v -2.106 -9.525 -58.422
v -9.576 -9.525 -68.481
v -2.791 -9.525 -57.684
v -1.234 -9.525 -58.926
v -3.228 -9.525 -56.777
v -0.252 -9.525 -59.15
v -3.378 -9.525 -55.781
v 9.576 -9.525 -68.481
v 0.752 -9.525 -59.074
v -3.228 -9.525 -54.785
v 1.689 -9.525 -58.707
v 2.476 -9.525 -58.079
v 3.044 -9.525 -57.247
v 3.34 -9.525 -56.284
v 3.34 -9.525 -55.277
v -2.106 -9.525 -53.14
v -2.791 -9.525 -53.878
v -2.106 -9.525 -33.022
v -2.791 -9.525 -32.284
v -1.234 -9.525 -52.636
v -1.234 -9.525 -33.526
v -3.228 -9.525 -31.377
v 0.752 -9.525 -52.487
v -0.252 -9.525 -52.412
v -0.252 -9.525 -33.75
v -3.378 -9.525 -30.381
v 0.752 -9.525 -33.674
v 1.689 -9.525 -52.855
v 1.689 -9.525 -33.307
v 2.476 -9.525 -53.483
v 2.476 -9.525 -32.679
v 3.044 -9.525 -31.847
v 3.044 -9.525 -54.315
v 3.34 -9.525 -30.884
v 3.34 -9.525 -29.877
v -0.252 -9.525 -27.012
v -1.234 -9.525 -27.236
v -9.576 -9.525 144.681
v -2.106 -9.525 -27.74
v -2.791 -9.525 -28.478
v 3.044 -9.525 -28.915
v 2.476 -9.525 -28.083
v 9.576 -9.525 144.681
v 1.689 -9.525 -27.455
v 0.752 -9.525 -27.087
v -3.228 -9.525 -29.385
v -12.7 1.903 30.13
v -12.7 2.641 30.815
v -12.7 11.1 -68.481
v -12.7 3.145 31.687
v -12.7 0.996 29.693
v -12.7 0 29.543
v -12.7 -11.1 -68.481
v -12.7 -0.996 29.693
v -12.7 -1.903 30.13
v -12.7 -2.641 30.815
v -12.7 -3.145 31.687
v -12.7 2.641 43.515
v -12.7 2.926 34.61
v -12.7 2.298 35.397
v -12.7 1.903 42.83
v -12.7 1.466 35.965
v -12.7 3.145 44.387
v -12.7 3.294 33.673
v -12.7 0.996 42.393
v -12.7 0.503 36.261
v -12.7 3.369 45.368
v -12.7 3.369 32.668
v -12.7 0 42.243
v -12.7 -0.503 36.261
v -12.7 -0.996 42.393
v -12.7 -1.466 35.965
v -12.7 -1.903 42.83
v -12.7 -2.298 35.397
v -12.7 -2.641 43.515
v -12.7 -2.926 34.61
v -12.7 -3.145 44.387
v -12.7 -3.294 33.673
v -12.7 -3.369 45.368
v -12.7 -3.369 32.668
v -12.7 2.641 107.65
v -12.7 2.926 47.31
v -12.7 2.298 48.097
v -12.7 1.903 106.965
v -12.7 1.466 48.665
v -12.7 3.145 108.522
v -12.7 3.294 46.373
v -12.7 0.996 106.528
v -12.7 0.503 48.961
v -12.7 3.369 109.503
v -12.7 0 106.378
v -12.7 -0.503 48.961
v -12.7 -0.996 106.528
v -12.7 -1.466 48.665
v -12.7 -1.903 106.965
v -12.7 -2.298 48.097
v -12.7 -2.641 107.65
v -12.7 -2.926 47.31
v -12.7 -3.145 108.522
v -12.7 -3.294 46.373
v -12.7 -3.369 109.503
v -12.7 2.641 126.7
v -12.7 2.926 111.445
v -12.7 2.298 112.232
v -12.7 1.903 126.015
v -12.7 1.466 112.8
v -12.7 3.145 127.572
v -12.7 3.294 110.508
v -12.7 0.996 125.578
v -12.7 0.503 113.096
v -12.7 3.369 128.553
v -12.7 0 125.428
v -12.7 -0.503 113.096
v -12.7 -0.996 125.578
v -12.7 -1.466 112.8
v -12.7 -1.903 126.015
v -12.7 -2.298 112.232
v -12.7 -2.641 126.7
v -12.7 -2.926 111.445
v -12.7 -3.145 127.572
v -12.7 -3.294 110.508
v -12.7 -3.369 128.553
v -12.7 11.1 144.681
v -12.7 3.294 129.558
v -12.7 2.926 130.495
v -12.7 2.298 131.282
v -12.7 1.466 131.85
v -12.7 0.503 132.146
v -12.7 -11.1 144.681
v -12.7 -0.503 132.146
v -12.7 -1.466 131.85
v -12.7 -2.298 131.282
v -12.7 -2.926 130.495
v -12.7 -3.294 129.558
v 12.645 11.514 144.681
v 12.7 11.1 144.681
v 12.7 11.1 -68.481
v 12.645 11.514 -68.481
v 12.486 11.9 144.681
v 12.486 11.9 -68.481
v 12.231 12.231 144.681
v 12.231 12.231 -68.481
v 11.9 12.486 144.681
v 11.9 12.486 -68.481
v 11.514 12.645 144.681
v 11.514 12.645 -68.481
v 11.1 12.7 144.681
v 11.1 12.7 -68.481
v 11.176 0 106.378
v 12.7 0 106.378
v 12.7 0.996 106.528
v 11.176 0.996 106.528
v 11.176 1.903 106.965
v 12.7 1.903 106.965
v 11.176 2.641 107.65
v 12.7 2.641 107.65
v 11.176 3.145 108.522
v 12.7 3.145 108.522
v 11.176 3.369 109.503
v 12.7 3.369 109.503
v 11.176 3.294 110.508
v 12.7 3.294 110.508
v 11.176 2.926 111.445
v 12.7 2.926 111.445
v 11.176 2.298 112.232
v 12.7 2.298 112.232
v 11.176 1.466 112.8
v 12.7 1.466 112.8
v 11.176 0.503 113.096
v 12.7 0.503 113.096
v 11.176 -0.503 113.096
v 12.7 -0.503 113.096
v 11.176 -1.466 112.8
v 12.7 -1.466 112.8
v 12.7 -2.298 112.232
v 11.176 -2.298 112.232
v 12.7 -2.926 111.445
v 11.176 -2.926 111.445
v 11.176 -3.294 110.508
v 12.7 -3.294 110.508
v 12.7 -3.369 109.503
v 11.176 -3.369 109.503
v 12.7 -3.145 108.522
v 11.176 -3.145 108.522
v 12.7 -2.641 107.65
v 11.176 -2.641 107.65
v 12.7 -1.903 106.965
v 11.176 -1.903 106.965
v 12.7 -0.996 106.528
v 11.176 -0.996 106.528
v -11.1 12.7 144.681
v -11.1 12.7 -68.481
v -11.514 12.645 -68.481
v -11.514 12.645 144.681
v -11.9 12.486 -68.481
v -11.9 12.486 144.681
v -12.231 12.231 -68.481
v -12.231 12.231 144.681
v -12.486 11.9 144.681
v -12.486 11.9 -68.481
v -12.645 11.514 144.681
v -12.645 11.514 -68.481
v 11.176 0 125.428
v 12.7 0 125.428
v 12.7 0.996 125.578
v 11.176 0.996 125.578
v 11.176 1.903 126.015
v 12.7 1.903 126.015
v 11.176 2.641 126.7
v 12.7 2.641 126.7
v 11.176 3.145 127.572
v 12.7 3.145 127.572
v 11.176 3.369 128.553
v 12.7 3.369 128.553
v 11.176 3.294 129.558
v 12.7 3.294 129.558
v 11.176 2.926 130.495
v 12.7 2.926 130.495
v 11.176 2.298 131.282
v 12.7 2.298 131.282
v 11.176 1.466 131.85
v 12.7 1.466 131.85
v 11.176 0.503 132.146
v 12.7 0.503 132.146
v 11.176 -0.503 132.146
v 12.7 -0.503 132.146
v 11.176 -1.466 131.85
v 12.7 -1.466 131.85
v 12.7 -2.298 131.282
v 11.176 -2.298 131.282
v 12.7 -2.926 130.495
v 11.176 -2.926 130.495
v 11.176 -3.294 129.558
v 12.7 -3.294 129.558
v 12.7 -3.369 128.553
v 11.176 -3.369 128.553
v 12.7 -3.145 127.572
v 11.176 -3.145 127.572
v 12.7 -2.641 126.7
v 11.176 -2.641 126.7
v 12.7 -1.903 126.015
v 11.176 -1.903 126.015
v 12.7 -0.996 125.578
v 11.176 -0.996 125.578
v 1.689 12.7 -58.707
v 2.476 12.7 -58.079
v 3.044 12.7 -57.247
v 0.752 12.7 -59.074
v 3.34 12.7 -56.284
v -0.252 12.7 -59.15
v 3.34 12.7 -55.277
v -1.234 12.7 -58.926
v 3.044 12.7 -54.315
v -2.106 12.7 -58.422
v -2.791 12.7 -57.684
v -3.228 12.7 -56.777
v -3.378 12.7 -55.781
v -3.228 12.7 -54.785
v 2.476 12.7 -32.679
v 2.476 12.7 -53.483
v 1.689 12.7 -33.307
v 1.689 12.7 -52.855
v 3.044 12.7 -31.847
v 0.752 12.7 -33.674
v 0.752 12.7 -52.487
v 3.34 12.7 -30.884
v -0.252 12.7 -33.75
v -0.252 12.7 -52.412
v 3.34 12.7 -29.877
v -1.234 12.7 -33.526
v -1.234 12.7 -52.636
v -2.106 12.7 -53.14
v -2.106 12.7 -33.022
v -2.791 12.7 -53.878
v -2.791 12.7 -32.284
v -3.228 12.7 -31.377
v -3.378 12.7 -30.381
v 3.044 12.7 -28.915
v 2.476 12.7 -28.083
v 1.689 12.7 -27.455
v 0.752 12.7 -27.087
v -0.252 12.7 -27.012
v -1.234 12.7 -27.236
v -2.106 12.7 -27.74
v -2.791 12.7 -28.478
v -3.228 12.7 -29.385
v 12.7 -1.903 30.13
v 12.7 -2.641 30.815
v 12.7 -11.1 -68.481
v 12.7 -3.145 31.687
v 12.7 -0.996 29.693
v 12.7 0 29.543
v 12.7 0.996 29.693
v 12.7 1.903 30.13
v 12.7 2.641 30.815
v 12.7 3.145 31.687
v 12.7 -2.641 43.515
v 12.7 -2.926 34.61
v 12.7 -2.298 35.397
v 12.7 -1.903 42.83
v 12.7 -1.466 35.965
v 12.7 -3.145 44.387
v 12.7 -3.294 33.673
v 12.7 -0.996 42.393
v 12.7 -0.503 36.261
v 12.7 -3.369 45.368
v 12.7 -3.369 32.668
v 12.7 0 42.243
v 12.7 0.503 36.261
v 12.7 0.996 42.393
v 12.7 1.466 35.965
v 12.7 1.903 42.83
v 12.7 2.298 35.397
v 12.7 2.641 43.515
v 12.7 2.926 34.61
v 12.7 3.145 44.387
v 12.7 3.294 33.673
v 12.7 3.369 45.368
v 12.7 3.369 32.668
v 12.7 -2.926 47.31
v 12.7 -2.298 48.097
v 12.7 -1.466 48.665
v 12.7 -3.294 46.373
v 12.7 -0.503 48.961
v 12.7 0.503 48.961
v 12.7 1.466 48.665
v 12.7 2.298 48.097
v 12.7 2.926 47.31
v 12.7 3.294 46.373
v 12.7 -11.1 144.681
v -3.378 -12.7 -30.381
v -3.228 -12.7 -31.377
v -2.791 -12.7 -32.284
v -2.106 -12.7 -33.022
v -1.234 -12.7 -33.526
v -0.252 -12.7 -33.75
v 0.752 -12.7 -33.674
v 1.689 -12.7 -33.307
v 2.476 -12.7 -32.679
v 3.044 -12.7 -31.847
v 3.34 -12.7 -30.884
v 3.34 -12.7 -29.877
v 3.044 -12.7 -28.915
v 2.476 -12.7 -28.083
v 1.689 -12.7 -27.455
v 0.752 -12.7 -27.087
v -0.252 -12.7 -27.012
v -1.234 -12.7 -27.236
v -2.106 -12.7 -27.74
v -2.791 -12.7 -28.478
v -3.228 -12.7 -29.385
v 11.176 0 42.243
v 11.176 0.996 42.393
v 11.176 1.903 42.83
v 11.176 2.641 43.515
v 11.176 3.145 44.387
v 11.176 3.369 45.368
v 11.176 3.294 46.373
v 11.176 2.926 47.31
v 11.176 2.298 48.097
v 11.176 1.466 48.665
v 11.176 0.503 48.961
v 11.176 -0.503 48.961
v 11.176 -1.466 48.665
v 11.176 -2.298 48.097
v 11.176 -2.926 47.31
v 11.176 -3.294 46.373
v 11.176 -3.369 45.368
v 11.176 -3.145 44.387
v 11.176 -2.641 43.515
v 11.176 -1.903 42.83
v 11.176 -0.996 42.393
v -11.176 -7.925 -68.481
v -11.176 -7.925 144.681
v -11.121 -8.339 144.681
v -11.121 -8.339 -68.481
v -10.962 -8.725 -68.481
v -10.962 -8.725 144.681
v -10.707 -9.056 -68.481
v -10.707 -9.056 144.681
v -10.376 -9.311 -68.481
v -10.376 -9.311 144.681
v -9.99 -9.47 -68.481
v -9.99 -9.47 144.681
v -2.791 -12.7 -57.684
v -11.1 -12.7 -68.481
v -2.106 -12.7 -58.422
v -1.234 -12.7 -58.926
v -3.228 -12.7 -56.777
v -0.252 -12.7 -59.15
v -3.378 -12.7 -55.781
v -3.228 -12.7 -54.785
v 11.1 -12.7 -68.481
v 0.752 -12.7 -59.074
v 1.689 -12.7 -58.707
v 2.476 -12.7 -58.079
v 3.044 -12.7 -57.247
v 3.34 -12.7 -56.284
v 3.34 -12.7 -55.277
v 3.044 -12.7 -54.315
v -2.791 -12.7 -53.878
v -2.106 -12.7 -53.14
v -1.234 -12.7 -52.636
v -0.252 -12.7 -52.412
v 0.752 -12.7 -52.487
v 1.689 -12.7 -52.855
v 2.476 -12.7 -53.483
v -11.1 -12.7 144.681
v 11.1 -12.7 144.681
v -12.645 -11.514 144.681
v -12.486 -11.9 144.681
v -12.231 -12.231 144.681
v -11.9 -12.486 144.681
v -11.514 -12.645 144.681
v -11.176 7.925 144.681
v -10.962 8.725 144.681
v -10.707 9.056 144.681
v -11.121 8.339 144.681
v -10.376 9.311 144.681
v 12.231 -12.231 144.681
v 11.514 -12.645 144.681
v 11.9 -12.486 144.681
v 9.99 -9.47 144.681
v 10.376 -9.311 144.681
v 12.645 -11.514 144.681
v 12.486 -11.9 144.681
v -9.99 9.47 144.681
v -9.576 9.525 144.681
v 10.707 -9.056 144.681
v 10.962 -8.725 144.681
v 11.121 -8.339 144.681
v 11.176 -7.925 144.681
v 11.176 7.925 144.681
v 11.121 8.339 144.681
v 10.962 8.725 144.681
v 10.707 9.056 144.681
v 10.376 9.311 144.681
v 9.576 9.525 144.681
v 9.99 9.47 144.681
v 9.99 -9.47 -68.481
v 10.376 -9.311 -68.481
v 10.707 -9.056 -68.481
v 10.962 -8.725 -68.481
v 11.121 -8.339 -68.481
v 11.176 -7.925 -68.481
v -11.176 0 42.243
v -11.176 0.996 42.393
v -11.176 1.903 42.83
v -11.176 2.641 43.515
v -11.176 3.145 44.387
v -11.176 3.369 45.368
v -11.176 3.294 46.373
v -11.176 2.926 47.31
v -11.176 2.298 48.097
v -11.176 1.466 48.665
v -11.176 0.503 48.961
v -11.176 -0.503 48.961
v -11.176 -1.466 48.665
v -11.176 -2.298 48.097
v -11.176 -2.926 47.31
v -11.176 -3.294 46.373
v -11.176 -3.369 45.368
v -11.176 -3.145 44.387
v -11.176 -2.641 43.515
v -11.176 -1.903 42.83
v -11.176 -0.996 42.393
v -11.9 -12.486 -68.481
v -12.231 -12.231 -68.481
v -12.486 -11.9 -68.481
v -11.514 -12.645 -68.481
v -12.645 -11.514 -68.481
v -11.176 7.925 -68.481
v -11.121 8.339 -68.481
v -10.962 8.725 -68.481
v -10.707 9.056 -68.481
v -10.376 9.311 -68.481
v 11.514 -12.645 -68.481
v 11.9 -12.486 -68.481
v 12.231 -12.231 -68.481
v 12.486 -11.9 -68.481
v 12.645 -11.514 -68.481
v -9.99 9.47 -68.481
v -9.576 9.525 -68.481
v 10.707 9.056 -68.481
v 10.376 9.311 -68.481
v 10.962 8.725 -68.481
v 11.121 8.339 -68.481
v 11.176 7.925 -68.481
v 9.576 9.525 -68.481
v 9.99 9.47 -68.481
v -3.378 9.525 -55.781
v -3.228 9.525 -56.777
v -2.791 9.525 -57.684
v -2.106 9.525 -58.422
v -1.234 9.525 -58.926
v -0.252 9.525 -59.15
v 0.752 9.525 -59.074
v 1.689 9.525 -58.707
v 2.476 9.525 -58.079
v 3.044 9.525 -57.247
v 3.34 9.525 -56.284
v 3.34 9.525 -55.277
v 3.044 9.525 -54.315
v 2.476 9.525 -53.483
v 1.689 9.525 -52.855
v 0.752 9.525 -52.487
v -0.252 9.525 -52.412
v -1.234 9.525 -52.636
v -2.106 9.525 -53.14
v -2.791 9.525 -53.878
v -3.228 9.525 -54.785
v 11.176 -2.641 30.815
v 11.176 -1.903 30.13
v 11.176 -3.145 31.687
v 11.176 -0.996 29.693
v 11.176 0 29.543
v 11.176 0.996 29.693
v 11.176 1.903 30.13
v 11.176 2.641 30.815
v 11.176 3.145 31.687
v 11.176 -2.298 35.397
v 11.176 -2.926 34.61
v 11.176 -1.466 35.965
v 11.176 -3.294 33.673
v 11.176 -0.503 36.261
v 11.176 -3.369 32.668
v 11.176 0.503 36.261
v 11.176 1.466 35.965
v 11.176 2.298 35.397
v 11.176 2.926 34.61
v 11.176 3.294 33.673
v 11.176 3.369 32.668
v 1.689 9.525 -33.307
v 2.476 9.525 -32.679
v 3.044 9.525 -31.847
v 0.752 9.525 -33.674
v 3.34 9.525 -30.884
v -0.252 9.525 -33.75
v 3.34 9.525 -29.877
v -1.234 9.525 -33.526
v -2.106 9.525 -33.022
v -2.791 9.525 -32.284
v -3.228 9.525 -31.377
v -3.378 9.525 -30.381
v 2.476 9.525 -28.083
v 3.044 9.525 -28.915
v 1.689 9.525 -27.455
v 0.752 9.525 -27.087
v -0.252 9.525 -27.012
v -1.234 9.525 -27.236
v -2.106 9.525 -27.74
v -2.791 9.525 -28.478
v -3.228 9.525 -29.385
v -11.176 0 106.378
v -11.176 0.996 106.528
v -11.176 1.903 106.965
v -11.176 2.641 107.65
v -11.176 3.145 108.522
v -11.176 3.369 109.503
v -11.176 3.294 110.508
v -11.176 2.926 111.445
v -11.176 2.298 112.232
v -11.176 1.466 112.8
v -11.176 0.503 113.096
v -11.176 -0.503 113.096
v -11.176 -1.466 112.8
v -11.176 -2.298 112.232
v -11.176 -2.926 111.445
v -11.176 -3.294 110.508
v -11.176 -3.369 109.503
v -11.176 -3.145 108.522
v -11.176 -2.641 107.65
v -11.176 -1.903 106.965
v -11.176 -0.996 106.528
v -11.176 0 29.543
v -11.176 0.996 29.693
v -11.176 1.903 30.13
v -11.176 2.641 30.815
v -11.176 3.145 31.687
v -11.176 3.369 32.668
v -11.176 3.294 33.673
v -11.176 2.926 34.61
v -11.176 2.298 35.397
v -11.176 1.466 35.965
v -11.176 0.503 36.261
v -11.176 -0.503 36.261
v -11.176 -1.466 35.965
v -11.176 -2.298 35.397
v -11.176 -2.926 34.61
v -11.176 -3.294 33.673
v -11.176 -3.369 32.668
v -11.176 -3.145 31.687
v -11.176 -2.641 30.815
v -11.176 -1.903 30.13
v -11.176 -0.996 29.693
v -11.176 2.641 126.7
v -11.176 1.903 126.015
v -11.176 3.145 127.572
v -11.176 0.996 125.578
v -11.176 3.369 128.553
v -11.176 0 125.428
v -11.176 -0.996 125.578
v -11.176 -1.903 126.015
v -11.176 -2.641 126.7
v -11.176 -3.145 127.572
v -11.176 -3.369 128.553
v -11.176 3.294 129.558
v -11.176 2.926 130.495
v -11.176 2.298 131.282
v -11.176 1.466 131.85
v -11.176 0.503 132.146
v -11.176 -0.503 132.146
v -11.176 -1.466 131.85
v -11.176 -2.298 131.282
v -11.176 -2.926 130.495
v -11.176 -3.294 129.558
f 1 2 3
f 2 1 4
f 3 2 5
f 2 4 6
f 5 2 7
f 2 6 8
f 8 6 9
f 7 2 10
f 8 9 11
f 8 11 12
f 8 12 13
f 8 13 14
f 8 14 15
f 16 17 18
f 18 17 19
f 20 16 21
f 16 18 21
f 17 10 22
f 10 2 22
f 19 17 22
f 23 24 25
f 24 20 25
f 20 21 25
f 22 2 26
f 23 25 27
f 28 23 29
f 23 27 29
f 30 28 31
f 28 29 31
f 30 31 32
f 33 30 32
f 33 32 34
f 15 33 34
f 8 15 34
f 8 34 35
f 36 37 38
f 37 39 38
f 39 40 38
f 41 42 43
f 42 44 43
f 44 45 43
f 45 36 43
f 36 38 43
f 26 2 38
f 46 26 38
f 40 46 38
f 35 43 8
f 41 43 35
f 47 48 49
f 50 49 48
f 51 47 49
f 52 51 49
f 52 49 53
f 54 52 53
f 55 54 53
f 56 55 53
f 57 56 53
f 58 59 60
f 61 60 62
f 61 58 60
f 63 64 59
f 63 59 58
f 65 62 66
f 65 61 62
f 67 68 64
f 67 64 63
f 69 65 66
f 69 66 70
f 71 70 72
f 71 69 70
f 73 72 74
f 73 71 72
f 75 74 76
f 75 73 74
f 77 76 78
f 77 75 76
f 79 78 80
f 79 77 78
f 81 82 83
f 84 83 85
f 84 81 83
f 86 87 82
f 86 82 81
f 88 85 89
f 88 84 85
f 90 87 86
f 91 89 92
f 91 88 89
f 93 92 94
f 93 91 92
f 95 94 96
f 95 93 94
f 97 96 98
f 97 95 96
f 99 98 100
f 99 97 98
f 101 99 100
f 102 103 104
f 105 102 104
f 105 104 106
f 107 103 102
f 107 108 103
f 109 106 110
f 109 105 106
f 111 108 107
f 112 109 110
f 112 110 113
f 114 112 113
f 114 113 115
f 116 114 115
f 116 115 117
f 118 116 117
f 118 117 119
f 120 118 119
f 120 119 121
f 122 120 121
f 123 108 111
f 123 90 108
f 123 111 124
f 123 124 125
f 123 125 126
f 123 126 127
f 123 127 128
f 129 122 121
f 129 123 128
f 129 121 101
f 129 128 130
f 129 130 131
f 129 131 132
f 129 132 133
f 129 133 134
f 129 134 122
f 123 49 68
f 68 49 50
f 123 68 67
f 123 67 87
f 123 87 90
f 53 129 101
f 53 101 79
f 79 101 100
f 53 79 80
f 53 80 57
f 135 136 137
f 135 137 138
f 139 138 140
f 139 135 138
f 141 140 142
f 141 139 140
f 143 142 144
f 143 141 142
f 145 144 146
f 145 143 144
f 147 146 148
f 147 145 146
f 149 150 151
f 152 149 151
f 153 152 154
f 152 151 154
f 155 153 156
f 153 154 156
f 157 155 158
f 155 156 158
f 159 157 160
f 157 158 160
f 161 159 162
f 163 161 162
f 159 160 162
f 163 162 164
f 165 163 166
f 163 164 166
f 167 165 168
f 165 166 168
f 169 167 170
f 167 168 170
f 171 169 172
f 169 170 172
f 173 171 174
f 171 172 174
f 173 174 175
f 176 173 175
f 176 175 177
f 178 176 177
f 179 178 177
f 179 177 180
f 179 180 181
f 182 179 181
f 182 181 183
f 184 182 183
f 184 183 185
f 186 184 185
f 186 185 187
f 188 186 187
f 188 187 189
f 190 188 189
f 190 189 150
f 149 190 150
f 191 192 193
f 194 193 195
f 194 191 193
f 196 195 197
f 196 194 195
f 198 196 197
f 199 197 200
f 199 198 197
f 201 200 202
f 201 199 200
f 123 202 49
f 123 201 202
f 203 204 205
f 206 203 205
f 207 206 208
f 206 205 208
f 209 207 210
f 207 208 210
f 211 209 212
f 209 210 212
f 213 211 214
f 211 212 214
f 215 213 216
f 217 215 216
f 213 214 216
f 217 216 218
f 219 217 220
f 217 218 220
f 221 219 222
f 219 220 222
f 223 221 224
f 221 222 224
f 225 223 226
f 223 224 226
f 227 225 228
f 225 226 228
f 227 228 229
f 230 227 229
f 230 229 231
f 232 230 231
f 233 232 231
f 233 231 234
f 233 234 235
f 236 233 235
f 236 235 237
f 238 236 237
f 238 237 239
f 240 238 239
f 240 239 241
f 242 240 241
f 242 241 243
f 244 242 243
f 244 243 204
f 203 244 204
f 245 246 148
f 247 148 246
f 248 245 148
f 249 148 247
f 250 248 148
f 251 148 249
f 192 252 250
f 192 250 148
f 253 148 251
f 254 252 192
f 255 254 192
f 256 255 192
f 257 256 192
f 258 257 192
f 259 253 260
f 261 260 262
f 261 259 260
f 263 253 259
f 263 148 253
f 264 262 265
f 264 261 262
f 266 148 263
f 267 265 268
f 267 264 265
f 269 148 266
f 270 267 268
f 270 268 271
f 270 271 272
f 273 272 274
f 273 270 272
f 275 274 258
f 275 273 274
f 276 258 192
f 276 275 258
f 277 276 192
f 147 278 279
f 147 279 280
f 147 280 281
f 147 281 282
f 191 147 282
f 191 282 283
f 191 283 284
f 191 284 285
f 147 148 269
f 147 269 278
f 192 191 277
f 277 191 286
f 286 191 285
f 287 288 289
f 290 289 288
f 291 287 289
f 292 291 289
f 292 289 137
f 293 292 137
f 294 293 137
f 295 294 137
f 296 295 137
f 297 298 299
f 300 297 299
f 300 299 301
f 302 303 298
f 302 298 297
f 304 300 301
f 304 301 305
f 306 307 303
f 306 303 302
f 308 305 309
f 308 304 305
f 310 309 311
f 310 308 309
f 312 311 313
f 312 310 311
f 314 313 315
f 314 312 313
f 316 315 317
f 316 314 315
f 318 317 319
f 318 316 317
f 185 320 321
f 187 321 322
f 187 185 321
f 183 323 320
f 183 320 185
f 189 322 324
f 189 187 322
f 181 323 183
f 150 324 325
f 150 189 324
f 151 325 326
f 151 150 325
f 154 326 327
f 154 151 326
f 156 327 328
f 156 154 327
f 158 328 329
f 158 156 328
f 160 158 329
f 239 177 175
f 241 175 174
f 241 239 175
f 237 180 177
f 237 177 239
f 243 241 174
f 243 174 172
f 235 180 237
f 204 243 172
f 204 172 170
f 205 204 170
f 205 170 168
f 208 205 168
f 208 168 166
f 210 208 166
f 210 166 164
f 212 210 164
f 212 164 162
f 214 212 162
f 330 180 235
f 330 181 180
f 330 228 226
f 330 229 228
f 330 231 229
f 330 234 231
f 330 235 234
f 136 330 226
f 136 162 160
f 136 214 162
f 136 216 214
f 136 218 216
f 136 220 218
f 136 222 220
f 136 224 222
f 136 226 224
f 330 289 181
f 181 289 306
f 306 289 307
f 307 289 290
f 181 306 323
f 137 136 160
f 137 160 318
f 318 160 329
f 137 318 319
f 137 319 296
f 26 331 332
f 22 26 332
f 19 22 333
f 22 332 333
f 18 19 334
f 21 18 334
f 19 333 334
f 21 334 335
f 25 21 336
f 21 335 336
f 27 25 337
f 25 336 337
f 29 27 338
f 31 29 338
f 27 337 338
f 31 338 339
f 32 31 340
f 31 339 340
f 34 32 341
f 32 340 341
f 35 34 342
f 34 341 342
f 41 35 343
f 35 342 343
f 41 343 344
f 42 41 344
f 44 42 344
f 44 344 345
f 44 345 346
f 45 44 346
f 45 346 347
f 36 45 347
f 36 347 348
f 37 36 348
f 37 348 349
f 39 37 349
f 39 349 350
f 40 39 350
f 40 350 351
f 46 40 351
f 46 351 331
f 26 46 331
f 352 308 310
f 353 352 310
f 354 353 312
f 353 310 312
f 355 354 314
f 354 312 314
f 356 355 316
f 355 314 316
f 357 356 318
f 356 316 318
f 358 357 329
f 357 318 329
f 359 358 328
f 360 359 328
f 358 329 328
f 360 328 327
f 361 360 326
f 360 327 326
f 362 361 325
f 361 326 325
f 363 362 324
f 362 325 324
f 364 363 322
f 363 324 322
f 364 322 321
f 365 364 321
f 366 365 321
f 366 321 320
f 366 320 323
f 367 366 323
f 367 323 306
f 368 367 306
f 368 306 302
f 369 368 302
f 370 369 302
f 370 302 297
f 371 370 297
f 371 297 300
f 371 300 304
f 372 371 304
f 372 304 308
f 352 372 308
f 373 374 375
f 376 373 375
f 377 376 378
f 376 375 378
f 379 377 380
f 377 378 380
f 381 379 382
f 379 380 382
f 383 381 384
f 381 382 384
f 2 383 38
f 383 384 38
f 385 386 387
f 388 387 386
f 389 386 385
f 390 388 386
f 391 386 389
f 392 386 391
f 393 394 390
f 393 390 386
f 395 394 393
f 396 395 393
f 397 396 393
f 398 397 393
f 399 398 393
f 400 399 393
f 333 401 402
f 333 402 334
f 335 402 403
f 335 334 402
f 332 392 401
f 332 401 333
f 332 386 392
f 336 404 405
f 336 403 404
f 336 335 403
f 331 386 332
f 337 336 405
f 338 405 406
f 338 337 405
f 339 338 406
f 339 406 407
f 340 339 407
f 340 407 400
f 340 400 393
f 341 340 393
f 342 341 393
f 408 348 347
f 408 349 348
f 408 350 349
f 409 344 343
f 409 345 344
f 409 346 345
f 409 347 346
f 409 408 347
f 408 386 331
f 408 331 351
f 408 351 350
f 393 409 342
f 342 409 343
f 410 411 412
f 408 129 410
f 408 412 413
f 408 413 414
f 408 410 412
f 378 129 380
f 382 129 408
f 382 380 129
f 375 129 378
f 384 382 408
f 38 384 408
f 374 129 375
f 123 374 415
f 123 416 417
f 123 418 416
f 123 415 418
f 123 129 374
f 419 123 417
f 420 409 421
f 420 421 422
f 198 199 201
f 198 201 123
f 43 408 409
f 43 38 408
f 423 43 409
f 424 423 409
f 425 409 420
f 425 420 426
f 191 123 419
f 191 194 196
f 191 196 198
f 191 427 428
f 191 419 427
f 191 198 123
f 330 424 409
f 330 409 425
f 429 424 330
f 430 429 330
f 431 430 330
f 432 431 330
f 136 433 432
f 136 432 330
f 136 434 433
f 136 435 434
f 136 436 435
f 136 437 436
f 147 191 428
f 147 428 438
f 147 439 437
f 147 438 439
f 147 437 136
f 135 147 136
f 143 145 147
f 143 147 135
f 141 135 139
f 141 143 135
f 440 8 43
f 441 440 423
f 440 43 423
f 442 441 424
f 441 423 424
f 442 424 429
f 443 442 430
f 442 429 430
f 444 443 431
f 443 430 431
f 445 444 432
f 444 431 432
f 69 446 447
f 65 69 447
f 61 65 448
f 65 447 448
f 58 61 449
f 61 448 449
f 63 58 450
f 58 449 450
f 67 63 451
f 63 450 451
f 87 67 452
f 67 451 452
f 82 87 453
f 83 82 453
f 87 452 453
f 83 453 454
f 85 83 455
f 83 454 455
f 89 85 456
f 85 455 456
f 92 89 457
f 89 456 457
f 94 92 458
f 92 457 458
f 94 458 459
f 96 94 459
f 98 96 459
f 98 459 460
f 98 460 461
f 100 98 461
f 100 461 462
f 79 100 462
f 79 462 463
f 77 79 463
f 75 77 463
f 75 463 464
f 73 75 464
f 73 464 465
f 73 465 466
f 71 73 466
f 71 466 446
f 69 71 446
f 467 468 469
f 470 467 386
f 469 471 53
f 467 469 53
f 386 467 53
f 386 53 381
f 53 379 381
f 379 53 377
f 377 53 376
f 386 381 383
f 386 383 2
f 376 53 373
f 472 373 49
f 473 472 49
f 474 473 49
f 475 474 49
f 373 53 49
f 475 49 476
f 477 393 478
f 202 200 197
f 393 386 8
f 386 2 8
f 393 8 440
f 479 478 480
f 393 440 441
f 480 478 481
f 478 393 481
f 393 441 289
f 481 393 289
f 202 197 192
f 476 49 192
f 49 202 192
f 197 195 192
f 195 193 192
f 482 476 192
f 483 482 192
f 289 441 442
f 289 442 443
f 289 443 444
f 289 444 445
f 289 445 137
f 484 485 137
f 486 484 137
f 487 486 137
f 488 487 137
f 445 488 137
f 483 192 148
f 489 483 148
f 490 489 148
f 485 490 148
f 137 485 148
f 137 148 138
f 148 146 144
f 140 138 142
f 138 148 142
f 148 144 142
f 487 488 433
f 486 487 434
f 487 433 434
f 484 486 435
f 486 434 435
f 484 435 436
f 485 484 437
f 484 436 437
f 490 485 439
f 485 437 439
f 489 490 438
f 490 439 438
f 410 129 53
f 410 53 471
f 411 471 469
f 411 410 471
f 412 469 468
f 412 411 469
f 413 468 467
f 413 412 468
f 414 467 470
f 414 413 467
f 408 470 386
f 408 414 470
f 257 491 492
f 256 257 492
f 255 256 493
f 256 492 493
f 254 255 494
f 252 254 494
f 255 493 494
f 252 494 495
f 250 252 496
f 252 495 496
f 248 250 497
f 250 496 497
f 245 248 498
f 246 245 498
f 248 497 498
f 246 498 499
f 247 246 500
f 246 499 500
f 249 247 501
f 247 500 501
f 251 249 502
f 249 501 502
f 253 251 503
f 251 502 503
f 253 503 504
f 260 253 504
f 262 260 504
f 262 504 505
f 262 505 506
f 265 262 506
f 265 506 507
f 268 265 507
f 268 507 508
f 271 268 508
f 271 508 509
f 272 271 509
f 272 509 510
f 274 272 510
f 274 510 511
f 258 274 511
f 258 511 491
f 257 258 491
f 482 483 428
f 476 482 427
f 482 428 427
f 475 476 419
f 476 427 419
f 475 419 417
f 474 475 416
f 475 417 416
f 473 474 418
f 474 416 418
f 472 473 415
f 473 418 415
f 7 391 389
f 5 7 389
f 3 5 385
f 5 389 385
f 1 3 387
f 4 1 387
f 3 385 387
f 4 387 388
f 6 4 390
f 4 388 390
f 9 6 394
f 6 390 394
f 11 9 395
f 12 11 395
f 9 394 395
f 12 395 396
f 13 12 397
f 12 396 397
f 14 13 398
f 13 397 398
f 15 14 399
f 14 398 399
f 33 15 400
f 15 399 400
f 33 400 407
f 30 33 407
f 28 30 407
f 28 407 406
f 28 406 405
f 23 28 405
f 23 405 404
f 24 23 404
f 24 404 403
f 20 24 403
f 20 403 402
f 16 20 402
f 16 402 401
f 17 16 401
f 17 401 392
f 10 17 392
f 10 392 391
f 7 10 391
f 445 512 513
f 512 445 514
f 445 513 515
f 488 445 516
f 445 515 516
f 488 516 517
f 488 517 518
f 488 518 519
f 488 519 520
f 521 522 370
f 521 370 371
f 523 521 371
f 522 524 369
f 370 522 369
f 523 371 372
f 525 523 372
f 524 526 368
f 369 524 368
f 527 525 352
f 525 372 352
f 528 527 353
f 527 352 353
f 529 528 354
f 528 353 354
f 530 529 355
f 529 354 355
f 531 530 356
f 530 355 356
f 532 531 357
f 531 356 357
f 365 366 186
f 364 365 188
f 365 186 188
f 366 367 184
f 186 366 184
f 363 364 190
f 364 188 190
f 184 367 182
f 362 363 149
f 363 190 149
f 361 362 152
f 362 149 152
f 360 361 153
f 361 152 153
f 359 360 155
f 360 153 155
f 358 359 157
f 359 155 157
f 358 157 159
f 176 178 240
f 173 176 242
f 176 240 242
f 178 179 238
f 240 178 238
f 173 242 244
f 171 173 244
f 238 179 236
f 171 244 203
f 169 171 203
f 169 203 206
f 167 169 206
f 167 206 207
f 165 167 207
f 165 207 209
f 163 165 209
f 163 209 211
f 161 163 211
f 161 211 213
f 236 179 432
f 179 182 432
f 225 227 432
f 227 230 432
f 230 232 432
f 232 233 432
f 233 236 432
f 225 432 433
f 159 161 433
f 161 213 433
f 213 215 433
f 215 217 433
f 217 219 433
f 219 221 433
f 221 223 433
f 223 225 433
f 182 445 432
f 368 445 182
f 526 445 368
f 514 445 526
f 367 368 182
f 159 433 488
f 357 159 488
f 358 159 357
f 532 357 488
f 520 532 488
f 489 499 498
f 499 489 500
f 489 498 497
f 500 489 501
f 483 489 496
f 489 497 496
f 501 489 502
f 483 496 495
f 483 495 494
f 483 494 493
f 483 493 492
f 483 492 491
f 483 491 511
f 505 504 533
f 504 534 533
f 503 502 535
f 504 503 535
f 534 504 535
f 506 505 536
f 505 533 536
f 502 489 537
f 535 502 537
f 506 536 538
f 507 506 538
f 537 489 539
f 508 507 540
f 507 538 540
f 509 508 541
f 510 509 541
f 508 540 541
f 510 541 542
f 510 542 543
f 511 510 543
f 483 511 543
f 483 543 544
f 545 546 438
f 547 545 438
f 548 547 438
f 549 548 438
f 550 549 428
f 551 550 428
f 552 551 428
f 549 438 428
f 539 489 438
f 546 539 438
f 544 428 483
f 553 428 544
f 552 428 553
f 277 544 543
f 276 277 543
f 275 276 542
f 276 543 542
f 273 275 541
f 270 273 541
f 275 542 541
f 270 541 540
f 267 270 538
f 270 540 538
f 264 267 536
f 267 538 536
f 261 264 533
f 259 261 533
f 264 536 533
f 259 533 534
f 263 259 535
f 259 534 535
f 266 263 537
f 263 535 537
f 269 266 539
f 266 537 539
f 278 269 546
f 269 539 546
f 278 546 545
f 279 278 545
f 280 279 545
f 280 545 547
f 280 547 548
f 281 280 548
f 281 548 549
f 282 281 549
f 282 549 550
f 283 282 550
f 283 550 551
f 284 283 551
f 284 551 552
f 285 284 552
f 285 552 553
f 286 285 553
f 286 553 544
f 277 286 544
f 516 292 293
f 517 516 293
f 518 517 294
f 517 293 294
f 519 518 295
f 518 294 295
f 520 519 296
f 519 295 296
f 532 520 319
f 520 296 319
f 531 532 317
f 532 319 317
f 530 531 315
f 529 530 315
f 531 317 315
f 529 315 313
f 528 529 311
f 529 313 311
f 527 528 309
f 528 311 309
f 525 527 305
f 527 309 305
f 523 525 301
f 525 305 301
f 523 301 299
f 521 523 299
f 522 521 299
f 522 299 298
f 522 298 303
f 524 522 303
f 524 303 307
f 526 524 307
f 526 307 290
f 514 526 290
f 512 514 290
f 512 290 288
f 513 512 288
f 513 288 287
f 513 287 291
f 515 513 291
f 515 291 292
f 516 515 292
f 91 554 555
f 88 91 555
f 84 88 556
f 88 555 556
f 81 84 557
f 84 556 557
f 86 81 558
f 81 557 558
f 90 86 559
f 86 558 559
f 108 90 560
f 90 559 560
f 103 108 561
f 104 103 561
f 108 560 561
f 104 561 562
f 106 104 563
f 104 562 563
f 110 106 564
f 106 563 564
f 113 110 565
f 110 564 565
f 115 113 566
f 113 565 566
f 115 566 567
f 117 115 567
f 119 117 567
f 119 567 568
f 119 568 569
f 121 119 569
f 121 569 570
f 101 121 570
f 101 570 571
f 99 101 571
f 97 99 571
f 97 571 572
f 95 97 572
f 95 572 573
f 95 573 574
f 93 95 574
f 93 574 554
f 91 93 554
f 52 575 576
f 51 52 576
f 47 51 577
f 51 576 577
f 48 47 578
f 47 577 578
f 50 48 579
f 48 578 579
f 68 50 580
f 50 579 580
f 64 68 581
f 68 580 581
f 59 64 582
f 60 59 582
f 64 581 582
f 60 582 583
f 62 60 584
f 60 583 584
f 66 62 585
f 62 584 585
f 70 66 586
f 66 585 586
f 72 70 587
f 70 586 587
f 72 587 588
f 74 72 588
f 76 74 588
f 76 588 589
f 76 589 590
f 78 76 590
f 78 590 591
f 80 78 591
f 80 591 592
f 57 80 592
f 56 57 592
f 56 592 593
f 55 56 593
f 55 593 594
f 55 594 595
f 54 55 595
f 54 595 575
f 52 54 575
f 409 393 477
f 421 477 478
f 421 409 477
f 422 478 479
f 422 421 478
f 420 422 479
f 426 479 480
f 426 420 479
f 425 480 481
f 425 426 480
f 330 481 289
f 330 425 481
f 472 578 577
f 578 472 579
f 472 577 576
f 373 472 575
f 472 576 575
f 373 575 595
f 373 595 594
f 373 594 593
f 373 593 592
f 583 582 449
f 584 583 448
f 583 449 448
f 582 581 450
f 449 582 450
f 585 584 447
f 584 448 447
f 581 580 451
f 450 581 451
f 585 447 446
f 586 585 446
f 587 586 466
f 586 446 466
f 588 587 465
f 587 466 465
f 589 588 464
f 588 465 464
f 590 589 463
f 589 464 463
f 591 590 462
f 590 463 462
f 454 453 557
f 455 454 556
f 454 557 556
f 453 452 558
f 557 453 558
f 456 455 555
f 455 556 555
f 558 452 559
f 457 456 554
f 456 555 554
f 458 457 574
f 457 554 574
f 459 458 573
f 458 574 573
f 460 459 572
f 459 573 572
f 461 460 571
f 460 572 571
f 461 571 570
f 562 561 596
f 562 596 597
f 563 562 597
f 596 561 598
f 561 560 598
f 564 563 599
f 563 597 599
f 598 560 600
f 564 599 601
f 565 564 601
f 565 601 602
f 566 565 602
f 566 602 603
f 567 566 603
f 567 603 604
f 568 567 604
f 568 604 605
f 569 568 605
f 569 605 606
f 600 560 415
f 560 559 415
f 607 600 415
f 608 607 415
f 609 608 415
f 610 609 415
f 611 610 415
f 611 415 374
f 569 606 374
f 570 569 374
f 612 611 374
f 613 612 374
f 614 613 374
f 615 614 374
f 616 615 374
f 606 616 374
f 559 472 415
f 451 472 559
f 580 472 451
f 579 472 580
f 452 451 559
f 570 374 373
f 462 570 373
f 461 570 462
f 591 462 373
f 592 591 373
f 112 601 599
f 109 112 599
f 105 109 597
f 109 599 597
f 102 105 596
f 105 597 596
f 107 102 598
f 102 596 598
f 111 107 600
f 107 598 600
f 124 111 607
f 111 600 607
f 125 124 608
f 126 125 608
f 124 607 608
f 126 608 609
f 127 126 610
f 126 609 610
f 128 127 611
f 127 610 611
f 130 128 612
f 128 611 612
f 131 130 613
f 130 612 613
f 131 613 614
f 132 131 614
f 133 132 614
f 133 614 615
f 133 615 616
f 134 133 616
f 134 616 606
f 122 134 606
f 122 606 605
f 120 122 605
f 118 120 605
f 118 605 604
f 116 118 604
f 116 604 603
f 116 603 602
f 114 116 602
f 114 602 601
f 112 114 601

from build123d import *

# Parameters (mm, degrees)
SKETCH3_W               = 25.4
SKETCH3_H               = 25.4
SKETCH3_W_2             = 22.352
SKETCH3_H_2             = 19.05
BOSS_EXTRUDE1_DEPTH     = 68.48094
FILLET1_R               = 1.6002
F_1_4_CLEARANCE_HOLE2_D = 6.7564
F_1_4_CLEARANCE_HOLE3_D = 6.7564
BOSS_EXTRUDE2_START     = 76.2
BOSS_EXTRUDE2_DEPTH     = 76.2
SKETCH17_R              = 3.3782
CUT_EXTRUDE3_DEPTH      = 148.441596571


with BuildPart() as part:
    # Sketch3 → Boss-Extrude1 (new, symmetric)
    with BuildSketch(Plane.XY):
        Rectangle(SKETCH3_W, SKETCH3_H)
        Rectangle(SKETCH3_W_2, SKETCH3_H_2, mode=Mode.SUBTRACT)
    extrude(amount=BOSS_EXTRUDE1_DEPTH, both=True)

    # Fillet1
    fillet1_edges = [part.edges().sort_by_distance(p)[0] for p in [
        (11.176, -9.525, 0),
        (11.176, 9.525, 0),
        (-11.176, 9.525, 0),
        (-11.176, -9.525, 0),
        (12.7, -12.7, 0),
        (-12.7, -12.7, 0),
        (-12.7, 12.7, 0),
        (12.7, 12.7, 0),
    ]]
    fillet(fillet1_edges, radius=FILLET1_R)

    # 1/4 Clearance Hole2 (through all)
    with Locations(Plane.ZY.offset(12.7)):
        with Locations((32.92094, 0), (45.62094, 0)):
            Hole(F_1_4_CLEARANCE_HOLE2_D / 2)

    # 1/4 Clearance Hole3 (through all)
    with Locations(Plane(origin=(0, 12.7, 0), x_dir=(1, 0, 0), z_dir=(0, 1, 0))):
        with Locations((0, 55.78094), (0, 30.38094)):
            Hole(F_1_4_CLEARANCE_HOLE3_D / 2)

    # Sketch16 → Boss-Extrude2 (add)
    with BuildSketch(Plane.XY.offset(68.48094).offset(BOSS_EXTRUDE2_START)):
        with BuildLine():
            Line((-12.7, 11.0998), (-12.7, -11.0998))
            ThreePointArc((-12.7, -11.0998), (-12.231312271, -12.231312271), (-11.0998, -12.7))
            Line((-11.0998, -12.7), (11.0998, -12.7))
            ThreePointArc((11.0998, -12.7), (12.231312271, -12.231312271), (12.7, -11.0998))
            Line((12.7, -11.0998), (12.7, 11.0998))
            ThreePointArc((12.7, 11.0998), (12.231312271, 12.231312271), (11.0998, 12.7))
            Line((11.0998, 12.7), (-11.0998, 12.7))
            ThreePointArc((-11.0998, 12.7), (-12.231312271, 12.231312271), (-12.7, 11.0998))
        make_face()
        with BuildLine():
            Line((11.176, -7.9248), (11.176, 7.9248))
            ThreePointArc((11.176, 7.9248), (10.707312271, 9.056312271), (9.5758, 9.525))
            Line((9.5758, 9.525), (-9.5758, 9.525))
            ThreePointArc((-9.5758, 9.525), (-10.707312271, 9.056312271), (-11.176, 7.9248))
            Line((-11.176, 7.9248), (-11.176, -7.9248))
            ThreePointArc((-11.176, -7.9248), (-10.707312271, -9.056312271), (-9.5758, -9.525))
            Line((-9.5758, -9.525), (9.5758, -9.525))
            ThreePointArc((9.5758, -9.525), (10.707312271, -9.056312271), (11.176, -7.9248))
        make_face(mode=Mode.SUBTRACT)
    extrude(amount=-BOSS_EXTRUDE2_DEPTH)

    # Sketch17 → Cut-Extrude3 (cut, through all)
    with BuildSketch(Plane(origin=(12.7, 0, 0), x_dir=(0, 0, -1), z_dir=(1, 0, 0))):
        with Locations((-109.75594, 0)):
            Circle(SKETCH17_R)
        with Locations((-128.80594, 0)):
            Circle(SKETCH17_R)
    extrude(amount=-CUT_EXTRUDE3_DEPTH, mode=Mode.SUBTRACT)


solid = part.part
